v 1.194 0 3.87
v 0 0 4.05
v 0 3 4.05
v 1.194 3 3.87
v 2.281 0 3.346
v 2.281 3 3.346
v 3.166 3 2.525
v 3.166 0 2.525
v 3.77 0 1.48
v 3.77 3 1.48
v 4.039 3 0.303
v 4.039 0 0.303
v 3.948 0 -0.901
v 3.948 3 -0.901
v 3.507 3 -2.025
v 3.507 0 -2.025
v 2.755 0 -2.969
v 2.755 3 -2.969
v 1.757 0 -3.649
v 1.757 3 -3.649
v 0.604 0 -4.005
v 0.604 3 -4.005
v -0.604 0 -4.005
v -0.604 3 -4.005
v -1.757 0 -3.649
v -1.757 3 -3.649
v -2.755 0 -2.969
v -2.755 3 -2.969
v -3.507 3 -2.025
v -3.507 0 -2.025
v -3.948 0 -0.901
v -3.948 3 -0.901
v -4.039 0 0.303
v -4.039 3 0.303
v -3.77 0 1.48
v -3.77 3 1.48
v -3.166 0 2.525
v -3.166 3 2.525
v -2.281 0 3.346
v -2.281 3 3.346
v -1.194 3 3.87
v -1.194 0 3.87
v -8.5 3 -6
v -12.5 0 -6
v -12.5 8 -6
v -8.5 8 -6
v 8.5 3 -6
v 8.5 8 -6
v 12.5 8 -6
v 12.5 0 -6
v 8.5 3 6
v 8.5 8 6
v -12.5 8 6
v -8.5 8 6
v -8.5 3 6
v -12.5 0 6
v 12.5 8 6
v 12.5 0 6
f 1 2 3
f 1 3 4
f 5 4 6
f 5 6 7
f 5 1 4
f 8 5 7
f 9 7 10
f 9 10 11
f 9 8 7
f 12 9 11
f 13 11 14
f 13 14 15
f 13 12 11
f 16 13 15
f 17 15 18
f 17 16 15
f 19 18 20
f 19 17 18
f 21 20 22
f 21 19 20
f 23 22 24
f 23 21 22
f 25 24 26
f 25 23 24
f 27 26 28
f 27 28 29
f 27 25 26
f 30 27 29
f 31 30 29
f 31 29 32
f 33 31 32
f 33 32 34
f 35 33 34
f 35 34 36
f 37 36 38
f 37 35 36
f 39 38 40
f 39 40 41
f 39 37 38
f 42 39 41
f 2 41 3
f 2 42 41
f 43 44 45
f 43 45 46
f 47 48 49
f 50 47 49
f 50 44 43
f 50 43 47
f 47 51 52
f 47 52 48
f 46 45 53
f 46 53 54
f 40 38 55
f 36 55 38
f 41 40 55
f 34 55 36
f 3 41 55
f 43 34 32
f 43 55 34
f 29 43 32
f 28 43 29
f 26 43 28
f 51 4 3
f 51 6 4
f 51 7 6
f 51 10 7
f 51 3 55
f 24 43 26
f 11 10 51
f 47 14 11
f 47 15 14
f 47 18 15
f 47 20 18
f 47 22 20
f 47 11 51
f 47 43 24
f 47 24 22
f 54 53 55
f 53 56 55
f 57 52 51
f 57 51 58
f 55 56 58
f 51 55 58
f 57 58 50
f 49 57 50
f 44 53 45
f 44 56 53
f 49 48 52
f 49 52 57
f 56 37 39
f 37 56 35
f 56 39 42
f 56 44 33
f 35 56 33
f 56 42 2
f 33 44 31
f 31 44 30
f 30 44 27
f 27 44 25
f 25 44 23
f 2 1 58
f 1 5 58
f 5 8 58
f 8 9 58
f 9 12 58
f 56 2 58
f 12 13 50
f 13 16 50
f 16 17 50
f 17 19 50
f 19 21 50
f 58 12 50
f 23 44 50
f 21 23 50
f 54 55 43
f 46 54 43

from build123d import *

# Parameters (mm, degrees)
SKETCH1_W           = 25
SKETCH1_H           = 12
SKETCH1_R           = 4.05
BOSS_EXTRUDE1_DEPTH = 3
SKETCH2_W           = 4
SKETCH2_H           = 12
BOSS_EXTRUDE2_DEPTH = 5


with BuildPart() as part:
    # Sketch1 → Boss-Extrude1 (new body)
    with BuildSketch(Plane(origin=(0, 0, 0), x_dir=(1, 0, 0), z_dir=(0, 1, 0))):
        Rectangle(SKETCH1_W, SKETCH1_H)
        with Locations(Location((0, 0, 0), (0, 0, 270))):
            Circle(SKETCH1_R, mode=Mode.SUBTRACT)
    extrude(amount=BOSS_EXTRUDE1_DEPTH)

    # Sketch2 → Boss-Extrude2 (add)
    with BuildSketch(Plane(origin=(0, 3, 0), x_dir=(1, 0, 0), z_dir=(0, 1, 0))):
        with Locations((-10.5, 0)):
            Rectangle(SKETCH2_W, SKETCH2_H)
        with Locations((10.5, 0)):
            Rectangle(SKETCH2_W, SKETCH2_H)
    extrude(amount=BOSS_EXTRUDE2_DEPTH)


solid = part.part
